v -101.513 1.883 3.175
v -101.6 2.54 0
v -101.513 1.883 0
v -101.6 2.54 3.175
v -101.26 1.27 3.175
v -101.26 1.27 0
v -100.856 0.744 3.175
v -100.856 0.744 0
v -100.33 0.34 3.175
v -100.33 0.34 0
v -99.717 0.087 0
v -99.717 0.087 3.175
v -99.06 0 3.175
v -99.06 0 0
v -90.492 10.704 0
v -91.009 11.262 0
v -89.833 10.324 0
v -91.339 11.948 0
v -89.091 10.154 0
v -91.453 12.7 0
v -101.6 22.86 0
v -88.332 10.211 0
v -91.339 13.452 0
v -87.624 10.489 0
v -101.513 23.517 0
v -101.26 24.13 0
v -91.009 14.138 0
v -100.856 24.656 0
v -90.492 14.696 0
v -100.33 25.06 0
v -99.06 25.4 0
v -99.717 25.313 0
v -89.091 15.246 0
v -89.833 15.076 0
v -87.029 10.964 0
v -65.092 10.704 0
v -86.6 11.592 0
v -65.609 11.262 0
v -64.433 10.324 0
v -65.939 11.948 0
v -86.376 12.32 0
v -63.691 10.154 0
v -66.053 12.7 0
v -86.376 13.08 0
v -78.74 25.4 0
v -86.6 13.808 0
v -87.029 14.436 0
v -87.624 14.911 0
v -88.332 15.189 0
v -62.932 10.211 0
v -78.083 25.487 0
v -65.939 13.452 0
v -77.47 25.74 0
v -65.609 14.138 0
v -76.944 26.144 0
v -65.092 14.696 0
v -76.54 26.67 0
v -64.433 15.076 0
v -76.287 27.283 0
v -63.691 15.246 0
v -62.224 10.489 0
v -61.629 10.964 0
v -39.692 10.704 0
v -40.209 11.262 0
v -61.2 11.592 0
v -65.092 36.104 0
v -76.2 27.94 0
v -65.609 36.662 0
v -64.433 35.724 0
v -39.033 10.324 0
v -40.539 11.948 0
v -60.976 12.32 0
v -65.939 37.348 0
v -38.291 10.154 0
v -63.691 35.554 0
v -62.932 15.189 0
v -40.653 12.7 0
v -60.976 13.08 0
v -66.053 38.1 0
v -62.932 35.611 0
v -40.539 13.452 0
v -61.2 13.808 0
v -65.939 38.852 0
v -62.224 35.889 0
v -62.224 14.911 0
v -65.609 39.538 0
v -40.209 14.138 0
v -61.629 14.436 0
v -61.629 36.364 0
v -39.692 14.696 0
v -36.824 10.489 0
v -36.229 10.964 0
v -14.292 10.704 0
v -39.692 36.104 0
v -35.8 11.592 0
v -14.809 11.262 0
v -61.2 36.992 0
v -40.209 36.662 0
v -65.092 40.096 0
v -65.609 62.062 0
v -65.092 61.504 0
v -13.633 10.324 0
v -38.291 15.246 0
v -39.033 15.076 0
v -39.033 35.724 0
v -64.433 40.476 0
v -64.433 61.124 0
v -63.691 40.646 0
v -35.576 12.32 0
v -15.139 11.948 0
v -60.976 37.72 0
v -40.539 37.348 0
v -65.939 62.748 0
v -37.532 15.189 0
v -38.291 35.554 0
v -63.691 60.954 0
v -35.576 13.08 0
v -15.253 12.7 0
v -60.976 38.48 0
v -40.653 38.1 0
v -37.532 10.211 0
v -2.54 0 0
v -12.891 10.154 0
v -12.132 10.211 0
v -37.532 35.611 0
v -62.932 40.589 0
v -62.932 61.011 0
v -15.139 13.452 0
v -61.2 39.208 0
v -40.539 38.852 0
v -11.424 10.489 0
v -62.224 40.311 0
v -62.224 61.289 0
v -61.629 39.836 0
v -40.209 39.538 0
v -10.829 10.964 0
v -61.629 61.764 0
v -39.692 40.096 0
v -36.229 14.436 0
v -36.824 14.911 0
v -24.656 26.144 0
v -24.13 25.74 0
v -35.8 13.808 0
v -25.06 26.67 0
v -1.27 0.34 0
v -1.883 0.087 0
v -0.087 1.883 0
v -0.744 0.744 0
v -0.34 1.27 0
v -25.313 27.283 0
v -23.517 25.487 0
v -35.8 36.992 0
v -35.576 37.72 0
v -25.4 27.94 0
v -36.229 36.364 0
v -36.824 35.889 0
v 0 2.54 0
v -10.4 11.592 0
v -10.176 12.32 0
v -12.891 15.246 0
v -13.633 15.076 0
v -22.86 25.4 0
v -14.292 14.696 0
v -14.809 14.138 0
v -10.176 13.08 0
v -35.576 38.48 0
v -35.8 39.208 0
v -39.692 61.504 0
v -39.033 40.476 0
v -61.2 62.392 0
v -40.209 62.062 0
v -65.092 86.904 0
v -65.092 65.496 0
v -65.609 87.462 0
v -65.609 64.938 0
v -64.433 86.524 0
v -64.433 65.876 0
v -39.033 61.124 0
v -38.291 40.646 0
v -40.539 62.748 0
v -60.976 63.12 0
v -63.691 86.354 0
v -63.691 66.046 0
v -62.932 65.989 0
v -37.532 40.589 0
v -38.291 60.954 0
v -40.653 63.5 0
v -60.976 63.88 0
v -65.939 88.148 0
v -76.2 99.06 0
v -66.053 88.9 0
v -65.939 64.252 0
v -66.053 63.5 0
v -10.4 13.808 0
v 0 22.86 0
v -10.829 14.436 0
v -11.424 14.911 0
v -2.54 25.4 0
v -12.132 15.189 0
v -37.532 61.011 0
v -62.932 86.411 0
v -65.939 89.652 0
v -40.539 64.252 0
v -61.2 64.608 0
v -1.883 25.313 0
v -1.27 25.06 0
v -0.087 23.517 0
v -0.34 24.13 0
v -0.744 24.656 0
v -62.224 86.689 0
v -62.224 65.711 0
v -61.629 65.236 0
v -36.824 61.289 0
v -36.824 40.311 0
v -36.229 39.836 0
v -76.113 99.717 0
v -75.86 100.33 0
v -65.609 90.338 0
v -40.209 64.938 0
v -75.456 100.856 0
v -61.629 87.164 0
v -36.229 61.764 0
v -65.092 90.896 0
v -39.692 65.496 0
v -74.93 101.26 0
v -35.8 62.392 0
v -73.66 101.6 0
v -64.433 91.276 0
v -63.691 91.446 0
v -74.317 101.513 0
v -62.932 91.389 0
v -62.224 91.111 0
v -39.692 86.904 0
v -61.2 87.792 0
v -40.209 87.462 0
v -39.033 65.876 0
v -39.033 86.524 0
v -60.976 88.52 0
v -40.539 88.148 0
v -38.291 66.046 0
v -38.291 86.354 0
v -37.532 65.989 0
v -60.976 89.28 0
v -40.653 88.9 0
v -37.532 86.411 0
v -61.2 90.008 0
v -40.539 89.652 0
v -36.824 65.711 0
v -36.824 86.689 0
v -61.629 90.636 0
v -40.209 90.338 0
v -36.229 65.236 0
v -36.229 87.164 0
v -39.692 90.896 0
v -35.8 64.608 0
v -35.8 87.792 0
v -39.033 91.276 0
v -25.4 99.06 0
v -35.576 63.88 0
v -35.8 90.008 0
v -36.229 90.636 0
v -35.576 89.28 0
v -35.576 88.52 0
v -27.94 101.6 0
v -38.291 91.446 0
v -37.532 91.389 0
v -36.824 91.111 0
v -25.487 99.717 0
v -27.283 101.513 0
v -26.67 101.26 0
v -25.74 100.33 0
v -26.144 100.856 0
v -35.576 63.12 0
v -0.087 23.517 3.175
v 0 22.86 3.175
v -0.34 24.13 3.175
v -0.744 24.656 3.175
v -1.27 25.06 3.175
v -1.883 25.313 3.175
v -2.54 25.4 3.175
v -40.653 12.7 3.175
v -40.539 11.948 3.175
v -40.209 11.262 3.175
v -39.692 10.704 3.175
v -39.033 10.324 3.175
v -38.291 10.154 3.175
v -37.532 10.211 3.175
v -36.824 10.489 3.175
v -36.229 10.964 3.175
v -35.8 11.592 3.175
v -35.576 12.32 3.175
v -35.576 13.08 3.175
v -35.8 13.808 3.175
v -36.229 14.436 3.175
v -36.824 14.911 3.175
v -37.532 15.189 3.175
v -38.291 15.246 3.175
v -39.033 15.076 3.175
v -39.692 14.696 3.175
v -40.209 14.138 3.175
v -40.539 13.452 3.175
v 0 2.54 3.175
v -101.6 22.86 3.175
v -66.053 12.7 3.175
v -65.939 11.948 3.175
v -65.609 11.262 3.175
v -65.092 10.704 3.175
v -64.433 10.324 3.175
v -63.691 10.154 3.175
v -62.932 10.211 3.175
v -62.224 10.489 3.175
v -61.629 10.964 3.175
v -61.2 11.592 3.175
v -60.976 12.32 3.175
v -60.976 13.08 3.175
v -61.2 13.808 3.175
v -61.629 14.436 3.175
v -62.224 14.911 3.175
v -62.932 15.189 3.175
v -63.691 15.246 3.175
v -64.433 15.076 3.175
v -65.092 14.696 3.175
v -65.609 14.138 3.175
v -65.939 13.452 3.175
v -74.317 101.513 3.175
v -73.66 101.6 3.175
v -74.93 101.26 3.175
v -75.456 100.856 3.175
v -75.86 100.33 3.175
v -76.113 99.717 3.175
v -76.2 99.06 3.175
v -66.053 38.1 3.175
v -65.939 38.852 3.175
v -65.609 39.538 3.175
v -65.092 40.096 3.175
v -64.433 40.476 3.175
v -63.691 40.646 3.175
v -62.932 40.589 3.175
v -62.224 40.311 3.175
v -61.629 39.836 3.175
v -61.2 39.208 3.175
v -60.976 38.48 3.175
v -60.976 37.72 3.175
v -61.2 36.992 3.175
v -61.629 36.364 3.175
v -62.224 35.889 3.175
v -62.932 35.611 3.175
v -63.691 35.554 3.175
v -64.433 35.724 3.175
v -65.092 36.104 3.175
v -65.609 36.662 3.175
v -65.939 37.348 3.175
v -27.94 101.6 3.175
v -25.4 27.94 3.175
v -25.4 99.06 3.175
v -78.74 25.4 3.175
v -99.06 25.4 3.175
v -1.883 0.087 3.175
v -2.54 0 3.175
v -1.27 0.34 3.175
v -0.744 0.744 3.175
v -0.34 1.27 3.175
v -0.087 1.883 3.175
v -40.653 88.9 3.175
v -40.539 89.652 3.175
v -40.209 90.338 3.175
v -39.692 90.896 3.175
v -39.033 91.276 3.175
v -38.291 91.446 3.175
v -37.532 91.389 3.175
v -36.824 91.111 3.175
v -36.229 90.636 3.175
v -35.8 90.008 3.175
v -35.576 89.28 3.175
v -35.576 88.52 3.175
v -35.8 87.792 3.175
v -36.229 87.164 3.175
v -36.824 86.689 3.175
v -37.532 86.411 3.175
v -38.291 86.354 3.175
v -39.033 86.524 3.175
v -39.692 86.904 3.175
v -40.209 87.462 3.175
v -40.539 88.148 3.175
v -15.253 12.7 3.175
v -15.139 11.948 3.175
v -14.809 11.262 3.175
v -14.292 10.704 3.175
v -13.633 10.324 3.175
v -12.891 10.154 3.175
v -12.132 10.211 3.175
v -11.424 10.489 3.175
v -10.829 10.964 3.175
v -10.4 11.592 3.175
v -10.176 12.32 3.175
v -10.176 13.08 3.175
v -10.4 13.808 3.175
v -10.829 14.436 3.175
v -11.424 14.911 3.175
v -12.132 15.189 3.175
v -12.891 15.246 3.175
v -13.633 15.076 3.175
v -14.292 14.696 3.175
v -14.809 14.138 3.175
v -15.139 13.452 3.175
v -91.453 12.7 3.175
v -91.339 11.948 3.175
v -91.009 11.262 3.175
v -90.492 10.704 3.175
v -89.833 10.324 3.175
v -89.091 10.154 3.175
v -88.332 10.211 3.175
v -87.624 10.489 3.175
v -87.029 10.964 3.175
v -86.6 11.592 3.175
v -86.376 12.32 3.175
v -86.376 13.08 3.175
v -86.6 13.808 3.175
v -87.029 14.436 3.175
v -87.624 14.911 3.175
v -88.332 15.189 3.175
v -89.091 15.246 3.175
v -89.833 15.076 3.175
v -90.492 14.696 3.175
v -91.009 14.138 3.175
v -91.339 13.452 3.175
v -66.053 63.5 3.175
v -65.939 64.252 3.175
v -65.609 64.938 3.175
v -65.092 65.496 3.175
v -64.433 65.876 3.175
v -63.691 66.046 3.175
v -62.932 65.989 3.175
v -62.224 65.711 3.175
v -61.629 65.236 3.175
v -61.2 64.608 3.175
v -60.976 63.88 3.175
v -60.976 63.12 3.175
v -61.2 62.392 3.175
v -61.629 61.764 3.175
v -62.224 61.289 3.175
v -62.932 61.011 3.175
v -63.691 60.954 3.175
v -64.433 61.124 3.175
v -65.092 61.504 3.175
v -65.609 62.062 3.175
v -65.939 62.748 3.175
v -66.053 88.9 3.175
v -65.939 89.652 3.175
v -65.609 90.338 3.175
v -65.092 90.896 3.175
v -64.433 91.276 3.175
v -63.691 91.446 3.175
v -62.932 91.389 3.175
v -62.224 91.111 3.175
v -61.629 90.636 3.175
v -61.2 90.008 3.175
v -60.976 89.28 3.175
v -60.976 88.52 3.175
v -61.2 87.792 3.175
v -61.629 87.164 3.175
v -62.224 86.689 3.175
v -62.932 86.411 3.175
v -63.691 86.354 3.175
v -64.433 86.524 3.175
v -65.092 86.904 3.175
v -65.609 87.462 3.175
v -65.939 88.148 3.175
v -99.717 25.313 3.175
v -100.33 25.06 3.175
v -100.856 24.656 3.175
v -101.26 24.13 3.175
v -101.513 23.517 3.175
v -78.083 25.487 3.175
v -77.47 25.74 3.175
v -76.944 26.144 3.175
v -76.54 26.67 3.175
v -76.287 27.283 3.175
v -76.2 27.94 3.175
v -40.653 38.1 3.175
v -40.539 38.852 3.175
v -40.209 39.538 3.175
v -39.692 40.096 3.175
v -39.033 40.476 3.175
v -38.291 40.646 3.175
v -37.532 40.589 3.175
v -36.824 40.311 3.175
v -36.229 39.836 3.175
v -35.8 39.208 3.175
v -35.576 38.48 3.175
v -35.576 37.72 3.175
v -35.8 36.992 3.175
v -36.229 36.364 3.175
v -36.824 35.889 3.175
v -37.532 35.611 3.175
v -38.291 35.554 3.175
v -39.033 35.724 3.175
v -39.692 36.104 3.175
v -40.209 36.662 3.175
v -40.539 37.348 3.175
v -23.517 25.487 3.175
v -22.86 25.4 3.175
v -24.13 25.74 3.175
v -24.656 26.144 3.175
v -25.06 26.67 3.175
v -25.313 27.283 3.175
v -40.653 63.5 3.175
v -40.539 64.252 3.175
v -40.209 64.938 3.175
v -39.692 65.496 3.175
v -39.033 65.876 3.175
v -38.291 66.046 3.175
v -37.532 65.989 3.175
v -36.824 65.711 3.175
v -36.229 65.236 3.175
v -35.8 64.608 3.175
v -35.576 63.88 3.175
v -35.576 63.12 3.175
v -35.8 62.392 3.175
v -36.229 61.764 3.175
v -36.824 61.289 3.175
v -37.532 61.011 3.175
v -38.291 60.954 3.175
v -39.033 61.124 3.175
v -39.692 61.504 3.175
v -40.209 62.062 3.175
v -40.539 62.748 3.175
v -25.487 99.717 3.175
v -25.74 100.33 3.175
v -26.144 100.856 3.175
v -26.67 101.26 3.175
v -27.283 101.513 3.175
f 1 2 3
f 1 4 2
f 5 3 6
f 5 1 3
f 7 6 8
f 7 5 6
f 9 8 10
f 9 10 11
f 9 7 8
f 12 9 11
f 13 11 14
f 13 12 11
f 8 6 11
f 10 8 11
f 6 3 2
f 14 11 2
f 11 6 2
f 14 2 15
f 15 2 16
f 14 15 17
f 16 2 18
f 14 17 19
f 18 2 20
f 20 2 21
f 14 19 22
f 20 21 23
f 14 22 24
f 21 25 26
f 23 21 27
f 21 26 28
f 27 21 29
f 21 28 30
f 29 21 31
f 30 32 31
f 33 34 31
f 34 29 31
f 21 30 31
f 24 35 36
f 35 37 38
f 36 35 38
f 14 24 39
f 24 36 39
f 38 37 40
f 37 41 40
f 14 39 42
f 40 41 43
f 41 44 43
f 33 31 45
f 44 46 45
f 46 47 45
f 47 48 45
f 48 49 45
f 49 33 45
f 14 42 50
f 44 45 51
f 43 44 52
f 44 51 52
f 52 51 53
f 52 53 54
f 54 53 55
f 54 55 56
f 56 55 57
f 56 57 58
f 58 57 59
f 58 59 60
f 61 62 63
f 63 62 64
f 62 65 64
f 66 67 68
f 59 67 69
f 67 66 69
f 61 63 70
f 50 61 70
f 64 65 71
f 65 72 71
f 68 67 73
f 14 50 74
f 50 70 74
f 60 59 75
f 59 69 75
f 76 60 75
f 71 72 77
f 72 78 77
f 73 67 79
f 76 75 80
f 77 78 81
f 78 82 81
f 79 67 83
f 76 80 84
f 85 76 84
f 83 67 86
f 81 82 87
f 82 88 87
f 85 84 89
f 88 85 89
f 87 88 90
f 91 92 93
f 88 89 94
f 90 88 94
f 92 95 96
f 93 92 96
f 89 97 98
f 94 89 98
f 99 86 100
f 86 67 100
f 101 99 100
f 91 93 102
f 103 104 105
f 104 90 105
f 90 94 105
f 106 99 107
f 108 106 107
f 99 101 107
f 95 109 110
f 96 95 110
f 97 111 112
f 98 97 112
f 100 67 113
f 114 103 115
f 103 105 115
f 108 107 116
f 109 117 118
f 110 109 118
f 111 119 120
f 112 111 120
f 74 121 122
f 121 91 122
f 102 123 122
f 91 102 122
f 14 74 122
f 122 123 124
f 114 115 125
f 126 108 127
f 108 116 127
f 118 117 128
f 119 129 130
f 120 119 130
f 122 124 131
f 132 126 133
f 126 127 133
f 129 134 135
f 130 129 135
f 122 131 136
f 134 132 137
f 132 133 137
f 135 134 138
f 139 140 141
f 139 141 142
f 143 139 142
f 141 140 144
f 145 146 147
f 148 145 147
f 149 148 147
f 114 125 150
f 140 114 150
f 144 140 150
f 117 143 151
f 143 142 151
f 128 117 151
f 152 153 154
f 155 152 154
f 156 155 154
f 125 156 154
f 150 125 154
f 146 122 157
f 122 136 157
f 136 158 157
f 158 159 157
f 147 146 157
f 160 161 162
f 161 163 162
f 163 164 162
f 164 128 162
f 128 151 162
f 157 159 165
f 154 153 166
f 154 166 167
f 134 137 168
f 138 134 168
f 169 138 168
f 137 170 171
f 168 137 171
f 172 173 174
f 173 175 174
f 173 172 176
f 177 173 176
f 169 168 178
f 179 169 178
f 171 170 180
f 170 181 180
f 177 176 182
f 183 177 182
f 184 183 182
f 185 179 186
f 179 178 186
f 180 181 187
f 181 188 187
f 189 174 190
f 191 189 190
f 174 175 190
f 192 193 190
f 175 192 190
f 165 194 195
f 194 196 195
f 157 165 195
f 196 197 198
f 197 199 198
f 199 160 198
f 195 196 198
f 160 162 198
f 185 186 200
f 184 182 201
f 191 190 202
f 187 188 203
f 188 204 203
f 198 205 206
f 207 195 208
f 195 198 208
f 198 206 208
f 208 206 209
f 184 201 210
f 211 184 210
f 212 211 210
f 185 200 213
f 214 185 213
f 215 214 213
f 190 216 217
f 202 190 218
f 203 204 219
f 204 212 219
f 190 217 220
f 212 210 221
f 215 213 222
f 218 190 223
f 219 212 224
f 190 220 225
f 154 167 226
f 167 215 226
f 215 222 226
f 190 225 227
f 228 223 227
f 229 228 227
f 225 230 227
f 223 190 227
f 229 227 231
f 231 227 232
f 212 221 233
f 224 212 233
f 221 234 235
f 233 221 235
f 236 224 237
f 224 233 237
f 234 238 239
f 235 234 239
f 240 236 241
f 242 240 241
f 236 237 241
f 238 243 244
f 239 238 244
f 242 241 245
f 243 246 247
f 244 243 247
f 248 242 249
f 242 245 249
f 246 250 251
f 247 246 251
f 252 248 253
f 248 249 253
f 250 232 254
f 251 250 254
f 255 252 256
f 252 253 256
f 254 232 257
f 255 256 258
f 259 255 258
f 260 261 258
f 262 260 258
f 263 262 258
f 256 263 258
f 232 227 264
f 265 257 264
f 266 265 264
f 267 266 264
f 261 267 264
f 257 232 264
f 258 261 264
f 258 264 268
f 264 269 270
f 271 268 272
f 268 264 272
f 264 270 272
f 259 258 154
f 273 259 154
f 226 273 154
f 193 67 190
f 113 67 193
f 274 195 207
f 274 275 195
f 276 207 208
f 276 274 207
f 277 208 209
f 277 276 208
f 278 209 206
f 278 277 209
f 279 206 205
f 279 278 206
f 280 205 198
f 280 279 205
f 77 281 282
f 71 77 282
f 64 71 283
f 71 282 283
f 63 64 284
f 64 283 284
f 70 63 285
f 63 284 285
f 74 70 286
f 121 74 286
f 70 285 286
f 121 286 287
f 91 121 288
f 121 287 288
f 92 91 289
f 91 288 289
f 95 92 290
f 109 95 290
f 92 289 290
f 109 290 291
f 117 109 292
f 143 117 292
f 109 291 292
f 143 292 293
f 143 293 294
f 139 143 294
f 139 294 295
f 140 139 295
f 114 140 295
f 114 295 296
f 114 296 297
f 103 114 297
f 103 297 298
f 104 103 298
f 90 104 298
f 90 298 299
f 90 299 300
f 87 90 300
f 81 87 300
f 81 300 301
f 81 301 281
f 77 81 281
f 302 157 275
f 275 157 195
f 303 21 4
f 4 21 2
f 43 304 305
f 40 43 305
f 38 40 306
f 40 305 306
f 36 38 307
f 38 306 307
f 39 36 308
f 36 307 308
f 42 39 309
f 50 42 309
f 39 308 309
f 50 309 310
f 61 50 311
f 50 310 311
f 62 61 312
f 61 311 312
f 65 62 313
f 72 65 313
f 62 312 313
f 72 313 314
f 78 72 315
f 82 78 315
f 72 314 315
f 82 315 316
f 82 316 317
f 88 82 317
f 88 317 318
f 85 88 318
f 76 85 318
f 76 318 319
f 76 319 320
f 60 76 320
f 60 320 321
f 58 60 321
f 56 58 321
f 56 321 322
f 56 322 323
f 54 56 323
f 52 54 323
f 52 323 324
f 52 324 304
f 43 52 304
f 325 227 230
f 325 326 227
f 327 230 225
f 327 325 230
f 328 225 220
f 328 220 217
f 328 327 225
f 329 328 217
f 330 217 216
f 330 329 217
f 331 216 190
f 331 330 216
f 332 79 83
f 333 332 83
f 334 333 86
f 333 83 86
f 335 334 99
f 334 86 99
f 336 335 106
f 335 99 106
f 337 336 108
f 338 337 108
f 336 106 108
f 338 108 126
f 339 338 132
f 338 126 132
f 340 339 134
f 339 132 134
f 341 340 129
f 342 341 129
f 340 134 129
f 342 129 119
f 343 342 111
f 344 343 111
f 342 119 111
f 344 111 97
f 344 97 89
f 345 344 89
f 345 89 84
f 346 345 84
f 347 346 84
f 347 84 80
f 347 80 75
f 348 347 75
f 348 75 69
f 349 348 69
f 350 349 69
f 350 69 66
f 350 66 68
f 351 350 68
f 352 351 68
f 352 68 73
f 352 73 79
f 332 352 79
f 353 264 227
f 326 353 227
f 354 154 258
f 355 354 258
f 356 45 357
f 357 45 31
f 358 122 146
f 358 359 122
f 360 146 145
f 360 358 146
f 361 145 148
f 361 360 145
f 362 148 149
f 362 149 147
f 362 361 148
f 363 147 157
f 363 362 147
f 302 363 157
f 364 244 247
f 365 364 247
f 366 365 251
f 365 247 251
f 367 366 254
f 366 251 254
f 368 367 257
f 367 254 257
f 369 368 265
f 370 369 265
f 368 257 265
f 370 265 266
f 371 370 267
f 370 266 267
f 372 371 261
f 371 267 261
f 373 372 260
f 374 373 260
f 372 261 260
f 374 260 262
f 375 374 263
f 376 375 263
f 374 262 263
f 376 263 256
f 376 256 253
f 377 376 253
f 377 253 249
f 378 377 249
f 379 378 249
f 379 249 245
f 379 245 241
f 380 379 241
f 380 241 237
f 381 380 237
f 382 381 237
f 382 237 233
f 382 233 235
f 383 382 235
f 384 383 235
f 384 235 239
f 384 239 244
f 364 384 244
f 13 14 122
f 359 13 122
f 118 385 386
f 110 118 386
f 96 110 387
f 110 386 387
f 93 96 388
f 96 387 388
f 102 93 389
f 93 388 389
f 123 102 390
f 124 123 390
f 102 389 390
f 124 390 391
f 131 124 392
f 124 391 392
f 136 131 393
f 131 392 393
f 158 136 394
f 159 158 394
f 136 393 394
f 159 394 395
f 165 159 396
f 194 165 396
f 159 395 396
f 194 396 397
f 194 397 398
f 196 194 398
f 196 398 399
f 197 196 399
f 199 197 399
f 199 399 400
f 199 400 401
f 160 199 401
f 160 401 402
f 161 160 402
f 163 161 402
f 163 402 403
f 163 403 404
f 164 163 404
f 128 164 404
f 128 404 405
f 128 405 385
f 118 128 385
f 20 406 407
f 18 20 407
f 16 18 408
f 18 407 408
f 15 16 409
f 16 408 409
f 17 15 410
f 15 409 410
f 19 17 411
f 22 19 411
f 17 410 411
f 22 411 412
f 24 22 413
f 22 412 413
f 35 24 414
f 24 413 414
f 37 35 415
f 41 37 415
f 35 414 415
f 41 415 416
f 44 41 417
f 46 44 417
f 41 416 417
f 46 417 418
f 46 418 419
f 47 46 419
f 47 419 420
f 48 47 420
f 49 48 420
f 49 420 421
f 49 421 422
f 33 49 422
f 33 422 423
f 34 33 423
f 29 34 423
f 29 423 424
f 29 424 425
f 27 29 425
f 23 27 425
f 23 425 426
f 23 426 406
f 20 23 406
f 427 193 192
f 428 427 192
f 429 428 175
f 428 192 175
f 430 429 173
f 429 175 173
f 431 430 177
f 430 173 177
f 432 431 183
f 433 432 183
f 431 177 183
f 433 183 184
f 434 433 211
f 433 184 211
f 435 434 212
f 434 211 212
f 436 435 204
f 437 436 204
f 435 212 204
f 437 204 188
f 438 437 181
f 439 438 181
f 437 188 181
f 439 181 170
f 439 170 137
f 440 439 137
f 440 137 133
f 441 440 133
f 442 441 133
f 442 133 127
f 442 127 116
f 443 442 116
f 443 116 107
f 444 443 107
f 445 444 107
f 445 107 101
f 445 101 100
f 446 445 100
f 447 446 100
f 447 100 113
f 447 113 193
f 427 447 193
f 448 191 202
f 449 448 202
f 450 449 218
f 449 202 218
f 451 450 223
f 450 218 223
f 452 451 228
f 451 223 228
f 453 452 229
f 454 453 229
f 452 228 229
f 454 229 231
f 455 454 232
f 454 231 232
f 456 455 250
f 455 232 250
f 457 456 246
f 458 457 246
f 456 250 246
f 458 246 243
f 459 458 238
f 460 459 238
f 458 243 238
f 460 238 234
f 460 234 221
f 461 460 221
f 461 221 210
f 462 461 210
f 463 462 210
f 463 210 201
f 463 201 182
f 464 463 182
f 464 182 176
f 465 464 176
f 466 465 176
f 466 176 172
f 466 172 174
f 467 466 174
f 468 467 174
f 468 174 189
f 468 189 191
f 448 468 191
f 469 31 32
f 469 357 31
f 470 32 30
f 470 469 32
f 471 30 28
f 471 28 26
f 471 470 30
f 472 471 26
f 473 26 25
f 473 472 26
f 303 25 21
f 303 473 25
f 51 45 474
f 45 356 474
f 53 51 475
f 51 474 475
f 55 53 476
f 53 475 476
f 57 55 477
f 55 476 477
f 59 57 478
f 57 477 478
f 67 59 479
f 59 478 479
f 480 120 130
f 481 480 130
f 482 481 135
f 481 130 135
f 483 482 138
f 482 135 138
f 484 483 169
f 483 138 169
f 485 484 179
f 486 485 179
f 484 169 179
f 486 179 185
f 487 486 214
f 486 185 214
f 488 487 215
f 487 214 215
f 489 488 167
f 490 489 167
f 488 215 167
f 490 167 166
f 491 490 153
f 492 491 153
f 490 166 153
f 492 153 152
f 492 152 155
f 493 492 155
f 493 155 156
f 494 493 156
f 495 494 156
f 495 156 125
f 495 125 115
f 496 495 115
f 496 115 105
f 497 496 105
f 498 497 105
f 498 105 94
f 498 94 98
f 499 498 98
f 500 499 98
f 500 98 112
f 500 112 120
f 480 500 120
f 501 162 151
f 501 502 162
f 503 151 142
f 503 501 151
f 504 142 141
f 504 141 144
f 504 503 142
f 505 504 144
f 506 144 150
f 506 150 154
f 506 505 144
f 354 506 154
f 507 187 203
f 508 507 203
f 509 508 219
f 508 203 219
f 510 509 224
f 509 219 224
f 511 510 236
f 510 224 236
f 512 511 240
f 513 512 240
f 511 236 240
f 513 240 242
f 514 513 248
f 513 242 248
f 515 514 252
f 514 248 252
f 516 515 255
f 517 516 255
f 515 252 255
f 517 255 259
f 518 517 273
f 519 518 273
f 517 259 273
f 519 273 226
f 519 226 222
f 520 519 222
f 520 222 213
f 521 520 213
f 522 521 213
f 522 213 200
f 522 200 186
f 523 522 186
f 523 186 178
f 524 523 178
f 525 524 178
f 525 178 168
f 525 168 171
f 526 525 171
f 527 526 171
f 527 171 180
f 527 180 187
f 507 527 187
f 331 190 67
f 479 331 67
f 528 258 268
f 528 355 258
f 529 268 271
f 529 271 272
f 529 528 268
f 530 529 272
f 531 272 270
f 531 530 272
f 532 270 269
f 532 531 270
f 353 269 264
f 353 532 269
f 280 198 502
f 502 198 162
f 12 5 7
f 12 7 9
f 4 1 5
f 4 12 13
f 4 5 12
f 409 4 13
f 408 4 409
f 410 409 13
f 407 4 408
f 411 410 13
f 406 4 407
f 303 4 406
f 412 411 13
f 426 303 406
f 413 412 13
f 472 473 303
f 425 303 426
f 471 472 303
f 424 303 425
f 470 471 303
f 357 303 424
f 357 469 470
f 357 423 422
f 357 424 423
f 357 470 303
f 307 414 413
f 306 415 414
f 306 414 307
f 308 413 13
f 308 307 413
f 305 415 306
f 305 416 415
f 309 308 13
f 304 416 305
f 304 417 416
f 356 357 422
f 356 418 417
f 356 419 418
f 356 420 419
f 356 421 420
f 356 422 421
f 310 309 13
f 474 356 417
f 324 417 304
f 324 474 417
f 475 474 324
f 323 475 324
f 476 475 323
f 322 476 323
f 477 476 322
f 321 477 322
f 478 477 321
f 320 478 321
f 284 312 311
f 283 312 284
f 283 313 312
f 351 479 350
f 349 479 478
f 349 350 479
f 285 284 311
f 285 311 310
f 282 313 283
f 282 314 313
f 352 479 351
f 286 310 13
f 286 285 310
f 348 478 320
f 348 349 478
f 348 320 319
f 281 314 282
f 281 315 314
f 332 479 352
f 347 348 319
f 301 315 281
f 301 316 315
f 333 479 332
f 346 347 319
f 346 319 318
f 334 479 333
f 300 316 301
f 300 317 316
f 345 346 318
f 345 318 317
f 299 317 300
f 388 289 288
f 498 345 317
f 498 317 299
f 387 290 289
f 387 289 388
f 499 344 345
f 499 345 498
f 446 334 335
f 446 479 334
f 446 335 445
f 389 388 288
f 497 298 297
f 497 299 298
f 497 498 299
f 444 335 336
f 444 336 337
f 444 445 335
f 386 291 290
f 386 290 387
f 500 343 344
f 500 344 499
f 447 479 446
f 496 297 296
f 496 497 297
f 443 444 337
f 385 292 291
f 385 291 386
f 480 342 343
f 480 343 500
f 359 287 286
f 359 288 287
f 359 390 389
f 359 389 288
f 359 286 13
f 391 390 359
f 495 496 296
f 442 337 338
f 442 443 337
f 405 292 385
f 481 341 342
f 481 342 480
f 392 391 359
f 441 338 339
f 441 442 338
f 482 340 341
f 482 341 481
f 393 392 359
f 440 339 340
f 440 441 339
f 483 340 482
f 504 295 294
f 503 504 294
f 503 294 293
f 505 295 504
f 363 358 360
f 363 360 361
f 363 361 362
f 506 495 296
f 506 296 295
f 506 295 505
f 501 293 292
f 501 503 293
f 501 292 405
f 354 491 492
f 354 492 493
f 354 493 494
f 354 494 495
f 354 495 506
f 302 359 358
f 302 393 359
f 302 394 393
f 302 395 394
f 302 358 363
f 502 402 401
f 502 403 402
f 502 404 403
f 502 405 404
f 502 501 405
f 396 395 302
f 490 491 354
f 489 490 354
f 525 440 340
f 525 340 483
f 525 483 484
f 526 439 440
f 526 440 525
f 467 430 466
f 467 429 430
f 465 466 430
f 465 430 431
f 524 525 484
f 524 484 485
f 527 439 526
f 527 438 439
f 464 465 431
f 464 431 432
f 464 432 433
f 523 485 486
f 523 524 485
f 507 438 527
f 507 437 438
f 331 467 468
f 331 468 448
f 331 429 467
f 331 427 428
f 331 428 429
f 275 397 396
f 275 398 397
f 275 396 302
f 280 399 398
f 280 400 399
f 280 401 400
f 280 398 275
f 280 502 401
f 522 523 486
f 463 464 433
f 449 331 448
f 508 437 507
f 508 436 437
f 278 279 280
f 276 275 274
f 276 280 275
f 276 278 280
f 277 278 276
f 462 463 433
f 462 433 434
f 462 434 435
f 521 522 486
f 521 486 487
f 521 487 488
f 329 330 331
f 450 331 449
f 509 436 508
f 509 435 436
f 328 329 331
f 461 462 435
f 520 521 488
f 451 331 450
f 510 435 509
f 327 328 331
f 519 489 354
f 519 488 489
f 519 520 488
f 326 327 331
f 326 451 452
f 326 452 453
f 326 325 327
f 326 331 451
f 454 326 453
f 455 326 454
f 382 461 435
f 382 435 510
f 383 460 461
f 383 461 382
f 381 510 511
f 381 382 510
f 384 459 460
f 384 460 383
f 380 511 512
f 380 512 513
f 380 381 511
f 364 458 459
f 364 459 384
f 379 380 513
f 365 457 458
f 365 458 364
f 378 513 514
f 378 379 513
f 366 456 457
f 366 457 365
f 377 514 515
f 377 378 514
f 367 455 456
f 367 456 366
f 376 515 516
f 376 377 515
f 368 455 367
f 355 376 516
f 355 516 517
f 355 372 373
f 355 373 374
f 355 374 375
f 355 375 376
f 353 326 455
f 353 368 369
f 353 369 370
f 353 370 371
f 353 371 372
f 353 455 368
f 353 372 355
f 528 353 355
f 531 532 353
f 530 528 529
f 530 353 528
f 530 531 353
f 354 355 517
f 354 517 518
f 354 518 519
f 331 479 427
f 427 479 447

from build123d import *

# Parameters (mm, degrees)
BOSS_EXTRUDE1_DEPTH    = 3.175
FILLET1_R              = 2.54
F_10_CLEARANCE_HOLE1_D = 5.1054
F_10_CLEARANCE_HOLE2_D = 5.1054


with BuildPart() as part:
    # Sketch1 → Boss-Extrude1 (new body)
    with BuildSketch(Plane.XY):
        Polygon((-76.2, 25.4), (-101.6, 25.4), (-101.6, 0), (0, 0), (0, 25.4), (-25.4, 25.4), (-25.4, 101.6), (-76.2, 101.6), align=None)
    extrude(amount=BOSS_EXTRUDE1_DEPTH)

    # Fillet1
    fillet1_edges = [part.edges().sort_by_distance(p)[0] for p in [
        (0, 0, 1.5875),
        (-101.6, 0, 1.5875),
        (-101.6, 25.4, 1.5875),
        (-76.2, 25.4, 1.5875),
        (-76.2, 101.6, 1.5875),
        (-25.4, 101.6, 1.5875),
        (-25.4, 25.4, 1.5875),
        (0, 25.4, 1.5875),
    ]]
    fillet(fillet1_edges, radius=FILLET1_R)

    # #10 Clearance Hole1 (through all)
    with Locations(Plane.XY.offset(3.175)):
        with Locations((-63.5, 88.9), (-63.5, 63.5), (-63.5, 38.1), (-38.1, 88.9), (-38.1, 63.5), (-38.1, 38.1)):
            Hole(F_10_CLEARANCE_HOLE1_D / 2)

    # #10 Clearance Hole2 (through all)
    with Locations(Plane(origin=(0, 0, 0), x_dir=(1, 0, 0), z_dir=(0, 0, -1))):
        with Locations((-88.9, -12.7), (-63.5, -12.7), (-38.1, -12.7), (-12.7, -12.7)):
            Hole(F_10_CLEARANCE_HOLE2_D / 2)


solid = part.part
